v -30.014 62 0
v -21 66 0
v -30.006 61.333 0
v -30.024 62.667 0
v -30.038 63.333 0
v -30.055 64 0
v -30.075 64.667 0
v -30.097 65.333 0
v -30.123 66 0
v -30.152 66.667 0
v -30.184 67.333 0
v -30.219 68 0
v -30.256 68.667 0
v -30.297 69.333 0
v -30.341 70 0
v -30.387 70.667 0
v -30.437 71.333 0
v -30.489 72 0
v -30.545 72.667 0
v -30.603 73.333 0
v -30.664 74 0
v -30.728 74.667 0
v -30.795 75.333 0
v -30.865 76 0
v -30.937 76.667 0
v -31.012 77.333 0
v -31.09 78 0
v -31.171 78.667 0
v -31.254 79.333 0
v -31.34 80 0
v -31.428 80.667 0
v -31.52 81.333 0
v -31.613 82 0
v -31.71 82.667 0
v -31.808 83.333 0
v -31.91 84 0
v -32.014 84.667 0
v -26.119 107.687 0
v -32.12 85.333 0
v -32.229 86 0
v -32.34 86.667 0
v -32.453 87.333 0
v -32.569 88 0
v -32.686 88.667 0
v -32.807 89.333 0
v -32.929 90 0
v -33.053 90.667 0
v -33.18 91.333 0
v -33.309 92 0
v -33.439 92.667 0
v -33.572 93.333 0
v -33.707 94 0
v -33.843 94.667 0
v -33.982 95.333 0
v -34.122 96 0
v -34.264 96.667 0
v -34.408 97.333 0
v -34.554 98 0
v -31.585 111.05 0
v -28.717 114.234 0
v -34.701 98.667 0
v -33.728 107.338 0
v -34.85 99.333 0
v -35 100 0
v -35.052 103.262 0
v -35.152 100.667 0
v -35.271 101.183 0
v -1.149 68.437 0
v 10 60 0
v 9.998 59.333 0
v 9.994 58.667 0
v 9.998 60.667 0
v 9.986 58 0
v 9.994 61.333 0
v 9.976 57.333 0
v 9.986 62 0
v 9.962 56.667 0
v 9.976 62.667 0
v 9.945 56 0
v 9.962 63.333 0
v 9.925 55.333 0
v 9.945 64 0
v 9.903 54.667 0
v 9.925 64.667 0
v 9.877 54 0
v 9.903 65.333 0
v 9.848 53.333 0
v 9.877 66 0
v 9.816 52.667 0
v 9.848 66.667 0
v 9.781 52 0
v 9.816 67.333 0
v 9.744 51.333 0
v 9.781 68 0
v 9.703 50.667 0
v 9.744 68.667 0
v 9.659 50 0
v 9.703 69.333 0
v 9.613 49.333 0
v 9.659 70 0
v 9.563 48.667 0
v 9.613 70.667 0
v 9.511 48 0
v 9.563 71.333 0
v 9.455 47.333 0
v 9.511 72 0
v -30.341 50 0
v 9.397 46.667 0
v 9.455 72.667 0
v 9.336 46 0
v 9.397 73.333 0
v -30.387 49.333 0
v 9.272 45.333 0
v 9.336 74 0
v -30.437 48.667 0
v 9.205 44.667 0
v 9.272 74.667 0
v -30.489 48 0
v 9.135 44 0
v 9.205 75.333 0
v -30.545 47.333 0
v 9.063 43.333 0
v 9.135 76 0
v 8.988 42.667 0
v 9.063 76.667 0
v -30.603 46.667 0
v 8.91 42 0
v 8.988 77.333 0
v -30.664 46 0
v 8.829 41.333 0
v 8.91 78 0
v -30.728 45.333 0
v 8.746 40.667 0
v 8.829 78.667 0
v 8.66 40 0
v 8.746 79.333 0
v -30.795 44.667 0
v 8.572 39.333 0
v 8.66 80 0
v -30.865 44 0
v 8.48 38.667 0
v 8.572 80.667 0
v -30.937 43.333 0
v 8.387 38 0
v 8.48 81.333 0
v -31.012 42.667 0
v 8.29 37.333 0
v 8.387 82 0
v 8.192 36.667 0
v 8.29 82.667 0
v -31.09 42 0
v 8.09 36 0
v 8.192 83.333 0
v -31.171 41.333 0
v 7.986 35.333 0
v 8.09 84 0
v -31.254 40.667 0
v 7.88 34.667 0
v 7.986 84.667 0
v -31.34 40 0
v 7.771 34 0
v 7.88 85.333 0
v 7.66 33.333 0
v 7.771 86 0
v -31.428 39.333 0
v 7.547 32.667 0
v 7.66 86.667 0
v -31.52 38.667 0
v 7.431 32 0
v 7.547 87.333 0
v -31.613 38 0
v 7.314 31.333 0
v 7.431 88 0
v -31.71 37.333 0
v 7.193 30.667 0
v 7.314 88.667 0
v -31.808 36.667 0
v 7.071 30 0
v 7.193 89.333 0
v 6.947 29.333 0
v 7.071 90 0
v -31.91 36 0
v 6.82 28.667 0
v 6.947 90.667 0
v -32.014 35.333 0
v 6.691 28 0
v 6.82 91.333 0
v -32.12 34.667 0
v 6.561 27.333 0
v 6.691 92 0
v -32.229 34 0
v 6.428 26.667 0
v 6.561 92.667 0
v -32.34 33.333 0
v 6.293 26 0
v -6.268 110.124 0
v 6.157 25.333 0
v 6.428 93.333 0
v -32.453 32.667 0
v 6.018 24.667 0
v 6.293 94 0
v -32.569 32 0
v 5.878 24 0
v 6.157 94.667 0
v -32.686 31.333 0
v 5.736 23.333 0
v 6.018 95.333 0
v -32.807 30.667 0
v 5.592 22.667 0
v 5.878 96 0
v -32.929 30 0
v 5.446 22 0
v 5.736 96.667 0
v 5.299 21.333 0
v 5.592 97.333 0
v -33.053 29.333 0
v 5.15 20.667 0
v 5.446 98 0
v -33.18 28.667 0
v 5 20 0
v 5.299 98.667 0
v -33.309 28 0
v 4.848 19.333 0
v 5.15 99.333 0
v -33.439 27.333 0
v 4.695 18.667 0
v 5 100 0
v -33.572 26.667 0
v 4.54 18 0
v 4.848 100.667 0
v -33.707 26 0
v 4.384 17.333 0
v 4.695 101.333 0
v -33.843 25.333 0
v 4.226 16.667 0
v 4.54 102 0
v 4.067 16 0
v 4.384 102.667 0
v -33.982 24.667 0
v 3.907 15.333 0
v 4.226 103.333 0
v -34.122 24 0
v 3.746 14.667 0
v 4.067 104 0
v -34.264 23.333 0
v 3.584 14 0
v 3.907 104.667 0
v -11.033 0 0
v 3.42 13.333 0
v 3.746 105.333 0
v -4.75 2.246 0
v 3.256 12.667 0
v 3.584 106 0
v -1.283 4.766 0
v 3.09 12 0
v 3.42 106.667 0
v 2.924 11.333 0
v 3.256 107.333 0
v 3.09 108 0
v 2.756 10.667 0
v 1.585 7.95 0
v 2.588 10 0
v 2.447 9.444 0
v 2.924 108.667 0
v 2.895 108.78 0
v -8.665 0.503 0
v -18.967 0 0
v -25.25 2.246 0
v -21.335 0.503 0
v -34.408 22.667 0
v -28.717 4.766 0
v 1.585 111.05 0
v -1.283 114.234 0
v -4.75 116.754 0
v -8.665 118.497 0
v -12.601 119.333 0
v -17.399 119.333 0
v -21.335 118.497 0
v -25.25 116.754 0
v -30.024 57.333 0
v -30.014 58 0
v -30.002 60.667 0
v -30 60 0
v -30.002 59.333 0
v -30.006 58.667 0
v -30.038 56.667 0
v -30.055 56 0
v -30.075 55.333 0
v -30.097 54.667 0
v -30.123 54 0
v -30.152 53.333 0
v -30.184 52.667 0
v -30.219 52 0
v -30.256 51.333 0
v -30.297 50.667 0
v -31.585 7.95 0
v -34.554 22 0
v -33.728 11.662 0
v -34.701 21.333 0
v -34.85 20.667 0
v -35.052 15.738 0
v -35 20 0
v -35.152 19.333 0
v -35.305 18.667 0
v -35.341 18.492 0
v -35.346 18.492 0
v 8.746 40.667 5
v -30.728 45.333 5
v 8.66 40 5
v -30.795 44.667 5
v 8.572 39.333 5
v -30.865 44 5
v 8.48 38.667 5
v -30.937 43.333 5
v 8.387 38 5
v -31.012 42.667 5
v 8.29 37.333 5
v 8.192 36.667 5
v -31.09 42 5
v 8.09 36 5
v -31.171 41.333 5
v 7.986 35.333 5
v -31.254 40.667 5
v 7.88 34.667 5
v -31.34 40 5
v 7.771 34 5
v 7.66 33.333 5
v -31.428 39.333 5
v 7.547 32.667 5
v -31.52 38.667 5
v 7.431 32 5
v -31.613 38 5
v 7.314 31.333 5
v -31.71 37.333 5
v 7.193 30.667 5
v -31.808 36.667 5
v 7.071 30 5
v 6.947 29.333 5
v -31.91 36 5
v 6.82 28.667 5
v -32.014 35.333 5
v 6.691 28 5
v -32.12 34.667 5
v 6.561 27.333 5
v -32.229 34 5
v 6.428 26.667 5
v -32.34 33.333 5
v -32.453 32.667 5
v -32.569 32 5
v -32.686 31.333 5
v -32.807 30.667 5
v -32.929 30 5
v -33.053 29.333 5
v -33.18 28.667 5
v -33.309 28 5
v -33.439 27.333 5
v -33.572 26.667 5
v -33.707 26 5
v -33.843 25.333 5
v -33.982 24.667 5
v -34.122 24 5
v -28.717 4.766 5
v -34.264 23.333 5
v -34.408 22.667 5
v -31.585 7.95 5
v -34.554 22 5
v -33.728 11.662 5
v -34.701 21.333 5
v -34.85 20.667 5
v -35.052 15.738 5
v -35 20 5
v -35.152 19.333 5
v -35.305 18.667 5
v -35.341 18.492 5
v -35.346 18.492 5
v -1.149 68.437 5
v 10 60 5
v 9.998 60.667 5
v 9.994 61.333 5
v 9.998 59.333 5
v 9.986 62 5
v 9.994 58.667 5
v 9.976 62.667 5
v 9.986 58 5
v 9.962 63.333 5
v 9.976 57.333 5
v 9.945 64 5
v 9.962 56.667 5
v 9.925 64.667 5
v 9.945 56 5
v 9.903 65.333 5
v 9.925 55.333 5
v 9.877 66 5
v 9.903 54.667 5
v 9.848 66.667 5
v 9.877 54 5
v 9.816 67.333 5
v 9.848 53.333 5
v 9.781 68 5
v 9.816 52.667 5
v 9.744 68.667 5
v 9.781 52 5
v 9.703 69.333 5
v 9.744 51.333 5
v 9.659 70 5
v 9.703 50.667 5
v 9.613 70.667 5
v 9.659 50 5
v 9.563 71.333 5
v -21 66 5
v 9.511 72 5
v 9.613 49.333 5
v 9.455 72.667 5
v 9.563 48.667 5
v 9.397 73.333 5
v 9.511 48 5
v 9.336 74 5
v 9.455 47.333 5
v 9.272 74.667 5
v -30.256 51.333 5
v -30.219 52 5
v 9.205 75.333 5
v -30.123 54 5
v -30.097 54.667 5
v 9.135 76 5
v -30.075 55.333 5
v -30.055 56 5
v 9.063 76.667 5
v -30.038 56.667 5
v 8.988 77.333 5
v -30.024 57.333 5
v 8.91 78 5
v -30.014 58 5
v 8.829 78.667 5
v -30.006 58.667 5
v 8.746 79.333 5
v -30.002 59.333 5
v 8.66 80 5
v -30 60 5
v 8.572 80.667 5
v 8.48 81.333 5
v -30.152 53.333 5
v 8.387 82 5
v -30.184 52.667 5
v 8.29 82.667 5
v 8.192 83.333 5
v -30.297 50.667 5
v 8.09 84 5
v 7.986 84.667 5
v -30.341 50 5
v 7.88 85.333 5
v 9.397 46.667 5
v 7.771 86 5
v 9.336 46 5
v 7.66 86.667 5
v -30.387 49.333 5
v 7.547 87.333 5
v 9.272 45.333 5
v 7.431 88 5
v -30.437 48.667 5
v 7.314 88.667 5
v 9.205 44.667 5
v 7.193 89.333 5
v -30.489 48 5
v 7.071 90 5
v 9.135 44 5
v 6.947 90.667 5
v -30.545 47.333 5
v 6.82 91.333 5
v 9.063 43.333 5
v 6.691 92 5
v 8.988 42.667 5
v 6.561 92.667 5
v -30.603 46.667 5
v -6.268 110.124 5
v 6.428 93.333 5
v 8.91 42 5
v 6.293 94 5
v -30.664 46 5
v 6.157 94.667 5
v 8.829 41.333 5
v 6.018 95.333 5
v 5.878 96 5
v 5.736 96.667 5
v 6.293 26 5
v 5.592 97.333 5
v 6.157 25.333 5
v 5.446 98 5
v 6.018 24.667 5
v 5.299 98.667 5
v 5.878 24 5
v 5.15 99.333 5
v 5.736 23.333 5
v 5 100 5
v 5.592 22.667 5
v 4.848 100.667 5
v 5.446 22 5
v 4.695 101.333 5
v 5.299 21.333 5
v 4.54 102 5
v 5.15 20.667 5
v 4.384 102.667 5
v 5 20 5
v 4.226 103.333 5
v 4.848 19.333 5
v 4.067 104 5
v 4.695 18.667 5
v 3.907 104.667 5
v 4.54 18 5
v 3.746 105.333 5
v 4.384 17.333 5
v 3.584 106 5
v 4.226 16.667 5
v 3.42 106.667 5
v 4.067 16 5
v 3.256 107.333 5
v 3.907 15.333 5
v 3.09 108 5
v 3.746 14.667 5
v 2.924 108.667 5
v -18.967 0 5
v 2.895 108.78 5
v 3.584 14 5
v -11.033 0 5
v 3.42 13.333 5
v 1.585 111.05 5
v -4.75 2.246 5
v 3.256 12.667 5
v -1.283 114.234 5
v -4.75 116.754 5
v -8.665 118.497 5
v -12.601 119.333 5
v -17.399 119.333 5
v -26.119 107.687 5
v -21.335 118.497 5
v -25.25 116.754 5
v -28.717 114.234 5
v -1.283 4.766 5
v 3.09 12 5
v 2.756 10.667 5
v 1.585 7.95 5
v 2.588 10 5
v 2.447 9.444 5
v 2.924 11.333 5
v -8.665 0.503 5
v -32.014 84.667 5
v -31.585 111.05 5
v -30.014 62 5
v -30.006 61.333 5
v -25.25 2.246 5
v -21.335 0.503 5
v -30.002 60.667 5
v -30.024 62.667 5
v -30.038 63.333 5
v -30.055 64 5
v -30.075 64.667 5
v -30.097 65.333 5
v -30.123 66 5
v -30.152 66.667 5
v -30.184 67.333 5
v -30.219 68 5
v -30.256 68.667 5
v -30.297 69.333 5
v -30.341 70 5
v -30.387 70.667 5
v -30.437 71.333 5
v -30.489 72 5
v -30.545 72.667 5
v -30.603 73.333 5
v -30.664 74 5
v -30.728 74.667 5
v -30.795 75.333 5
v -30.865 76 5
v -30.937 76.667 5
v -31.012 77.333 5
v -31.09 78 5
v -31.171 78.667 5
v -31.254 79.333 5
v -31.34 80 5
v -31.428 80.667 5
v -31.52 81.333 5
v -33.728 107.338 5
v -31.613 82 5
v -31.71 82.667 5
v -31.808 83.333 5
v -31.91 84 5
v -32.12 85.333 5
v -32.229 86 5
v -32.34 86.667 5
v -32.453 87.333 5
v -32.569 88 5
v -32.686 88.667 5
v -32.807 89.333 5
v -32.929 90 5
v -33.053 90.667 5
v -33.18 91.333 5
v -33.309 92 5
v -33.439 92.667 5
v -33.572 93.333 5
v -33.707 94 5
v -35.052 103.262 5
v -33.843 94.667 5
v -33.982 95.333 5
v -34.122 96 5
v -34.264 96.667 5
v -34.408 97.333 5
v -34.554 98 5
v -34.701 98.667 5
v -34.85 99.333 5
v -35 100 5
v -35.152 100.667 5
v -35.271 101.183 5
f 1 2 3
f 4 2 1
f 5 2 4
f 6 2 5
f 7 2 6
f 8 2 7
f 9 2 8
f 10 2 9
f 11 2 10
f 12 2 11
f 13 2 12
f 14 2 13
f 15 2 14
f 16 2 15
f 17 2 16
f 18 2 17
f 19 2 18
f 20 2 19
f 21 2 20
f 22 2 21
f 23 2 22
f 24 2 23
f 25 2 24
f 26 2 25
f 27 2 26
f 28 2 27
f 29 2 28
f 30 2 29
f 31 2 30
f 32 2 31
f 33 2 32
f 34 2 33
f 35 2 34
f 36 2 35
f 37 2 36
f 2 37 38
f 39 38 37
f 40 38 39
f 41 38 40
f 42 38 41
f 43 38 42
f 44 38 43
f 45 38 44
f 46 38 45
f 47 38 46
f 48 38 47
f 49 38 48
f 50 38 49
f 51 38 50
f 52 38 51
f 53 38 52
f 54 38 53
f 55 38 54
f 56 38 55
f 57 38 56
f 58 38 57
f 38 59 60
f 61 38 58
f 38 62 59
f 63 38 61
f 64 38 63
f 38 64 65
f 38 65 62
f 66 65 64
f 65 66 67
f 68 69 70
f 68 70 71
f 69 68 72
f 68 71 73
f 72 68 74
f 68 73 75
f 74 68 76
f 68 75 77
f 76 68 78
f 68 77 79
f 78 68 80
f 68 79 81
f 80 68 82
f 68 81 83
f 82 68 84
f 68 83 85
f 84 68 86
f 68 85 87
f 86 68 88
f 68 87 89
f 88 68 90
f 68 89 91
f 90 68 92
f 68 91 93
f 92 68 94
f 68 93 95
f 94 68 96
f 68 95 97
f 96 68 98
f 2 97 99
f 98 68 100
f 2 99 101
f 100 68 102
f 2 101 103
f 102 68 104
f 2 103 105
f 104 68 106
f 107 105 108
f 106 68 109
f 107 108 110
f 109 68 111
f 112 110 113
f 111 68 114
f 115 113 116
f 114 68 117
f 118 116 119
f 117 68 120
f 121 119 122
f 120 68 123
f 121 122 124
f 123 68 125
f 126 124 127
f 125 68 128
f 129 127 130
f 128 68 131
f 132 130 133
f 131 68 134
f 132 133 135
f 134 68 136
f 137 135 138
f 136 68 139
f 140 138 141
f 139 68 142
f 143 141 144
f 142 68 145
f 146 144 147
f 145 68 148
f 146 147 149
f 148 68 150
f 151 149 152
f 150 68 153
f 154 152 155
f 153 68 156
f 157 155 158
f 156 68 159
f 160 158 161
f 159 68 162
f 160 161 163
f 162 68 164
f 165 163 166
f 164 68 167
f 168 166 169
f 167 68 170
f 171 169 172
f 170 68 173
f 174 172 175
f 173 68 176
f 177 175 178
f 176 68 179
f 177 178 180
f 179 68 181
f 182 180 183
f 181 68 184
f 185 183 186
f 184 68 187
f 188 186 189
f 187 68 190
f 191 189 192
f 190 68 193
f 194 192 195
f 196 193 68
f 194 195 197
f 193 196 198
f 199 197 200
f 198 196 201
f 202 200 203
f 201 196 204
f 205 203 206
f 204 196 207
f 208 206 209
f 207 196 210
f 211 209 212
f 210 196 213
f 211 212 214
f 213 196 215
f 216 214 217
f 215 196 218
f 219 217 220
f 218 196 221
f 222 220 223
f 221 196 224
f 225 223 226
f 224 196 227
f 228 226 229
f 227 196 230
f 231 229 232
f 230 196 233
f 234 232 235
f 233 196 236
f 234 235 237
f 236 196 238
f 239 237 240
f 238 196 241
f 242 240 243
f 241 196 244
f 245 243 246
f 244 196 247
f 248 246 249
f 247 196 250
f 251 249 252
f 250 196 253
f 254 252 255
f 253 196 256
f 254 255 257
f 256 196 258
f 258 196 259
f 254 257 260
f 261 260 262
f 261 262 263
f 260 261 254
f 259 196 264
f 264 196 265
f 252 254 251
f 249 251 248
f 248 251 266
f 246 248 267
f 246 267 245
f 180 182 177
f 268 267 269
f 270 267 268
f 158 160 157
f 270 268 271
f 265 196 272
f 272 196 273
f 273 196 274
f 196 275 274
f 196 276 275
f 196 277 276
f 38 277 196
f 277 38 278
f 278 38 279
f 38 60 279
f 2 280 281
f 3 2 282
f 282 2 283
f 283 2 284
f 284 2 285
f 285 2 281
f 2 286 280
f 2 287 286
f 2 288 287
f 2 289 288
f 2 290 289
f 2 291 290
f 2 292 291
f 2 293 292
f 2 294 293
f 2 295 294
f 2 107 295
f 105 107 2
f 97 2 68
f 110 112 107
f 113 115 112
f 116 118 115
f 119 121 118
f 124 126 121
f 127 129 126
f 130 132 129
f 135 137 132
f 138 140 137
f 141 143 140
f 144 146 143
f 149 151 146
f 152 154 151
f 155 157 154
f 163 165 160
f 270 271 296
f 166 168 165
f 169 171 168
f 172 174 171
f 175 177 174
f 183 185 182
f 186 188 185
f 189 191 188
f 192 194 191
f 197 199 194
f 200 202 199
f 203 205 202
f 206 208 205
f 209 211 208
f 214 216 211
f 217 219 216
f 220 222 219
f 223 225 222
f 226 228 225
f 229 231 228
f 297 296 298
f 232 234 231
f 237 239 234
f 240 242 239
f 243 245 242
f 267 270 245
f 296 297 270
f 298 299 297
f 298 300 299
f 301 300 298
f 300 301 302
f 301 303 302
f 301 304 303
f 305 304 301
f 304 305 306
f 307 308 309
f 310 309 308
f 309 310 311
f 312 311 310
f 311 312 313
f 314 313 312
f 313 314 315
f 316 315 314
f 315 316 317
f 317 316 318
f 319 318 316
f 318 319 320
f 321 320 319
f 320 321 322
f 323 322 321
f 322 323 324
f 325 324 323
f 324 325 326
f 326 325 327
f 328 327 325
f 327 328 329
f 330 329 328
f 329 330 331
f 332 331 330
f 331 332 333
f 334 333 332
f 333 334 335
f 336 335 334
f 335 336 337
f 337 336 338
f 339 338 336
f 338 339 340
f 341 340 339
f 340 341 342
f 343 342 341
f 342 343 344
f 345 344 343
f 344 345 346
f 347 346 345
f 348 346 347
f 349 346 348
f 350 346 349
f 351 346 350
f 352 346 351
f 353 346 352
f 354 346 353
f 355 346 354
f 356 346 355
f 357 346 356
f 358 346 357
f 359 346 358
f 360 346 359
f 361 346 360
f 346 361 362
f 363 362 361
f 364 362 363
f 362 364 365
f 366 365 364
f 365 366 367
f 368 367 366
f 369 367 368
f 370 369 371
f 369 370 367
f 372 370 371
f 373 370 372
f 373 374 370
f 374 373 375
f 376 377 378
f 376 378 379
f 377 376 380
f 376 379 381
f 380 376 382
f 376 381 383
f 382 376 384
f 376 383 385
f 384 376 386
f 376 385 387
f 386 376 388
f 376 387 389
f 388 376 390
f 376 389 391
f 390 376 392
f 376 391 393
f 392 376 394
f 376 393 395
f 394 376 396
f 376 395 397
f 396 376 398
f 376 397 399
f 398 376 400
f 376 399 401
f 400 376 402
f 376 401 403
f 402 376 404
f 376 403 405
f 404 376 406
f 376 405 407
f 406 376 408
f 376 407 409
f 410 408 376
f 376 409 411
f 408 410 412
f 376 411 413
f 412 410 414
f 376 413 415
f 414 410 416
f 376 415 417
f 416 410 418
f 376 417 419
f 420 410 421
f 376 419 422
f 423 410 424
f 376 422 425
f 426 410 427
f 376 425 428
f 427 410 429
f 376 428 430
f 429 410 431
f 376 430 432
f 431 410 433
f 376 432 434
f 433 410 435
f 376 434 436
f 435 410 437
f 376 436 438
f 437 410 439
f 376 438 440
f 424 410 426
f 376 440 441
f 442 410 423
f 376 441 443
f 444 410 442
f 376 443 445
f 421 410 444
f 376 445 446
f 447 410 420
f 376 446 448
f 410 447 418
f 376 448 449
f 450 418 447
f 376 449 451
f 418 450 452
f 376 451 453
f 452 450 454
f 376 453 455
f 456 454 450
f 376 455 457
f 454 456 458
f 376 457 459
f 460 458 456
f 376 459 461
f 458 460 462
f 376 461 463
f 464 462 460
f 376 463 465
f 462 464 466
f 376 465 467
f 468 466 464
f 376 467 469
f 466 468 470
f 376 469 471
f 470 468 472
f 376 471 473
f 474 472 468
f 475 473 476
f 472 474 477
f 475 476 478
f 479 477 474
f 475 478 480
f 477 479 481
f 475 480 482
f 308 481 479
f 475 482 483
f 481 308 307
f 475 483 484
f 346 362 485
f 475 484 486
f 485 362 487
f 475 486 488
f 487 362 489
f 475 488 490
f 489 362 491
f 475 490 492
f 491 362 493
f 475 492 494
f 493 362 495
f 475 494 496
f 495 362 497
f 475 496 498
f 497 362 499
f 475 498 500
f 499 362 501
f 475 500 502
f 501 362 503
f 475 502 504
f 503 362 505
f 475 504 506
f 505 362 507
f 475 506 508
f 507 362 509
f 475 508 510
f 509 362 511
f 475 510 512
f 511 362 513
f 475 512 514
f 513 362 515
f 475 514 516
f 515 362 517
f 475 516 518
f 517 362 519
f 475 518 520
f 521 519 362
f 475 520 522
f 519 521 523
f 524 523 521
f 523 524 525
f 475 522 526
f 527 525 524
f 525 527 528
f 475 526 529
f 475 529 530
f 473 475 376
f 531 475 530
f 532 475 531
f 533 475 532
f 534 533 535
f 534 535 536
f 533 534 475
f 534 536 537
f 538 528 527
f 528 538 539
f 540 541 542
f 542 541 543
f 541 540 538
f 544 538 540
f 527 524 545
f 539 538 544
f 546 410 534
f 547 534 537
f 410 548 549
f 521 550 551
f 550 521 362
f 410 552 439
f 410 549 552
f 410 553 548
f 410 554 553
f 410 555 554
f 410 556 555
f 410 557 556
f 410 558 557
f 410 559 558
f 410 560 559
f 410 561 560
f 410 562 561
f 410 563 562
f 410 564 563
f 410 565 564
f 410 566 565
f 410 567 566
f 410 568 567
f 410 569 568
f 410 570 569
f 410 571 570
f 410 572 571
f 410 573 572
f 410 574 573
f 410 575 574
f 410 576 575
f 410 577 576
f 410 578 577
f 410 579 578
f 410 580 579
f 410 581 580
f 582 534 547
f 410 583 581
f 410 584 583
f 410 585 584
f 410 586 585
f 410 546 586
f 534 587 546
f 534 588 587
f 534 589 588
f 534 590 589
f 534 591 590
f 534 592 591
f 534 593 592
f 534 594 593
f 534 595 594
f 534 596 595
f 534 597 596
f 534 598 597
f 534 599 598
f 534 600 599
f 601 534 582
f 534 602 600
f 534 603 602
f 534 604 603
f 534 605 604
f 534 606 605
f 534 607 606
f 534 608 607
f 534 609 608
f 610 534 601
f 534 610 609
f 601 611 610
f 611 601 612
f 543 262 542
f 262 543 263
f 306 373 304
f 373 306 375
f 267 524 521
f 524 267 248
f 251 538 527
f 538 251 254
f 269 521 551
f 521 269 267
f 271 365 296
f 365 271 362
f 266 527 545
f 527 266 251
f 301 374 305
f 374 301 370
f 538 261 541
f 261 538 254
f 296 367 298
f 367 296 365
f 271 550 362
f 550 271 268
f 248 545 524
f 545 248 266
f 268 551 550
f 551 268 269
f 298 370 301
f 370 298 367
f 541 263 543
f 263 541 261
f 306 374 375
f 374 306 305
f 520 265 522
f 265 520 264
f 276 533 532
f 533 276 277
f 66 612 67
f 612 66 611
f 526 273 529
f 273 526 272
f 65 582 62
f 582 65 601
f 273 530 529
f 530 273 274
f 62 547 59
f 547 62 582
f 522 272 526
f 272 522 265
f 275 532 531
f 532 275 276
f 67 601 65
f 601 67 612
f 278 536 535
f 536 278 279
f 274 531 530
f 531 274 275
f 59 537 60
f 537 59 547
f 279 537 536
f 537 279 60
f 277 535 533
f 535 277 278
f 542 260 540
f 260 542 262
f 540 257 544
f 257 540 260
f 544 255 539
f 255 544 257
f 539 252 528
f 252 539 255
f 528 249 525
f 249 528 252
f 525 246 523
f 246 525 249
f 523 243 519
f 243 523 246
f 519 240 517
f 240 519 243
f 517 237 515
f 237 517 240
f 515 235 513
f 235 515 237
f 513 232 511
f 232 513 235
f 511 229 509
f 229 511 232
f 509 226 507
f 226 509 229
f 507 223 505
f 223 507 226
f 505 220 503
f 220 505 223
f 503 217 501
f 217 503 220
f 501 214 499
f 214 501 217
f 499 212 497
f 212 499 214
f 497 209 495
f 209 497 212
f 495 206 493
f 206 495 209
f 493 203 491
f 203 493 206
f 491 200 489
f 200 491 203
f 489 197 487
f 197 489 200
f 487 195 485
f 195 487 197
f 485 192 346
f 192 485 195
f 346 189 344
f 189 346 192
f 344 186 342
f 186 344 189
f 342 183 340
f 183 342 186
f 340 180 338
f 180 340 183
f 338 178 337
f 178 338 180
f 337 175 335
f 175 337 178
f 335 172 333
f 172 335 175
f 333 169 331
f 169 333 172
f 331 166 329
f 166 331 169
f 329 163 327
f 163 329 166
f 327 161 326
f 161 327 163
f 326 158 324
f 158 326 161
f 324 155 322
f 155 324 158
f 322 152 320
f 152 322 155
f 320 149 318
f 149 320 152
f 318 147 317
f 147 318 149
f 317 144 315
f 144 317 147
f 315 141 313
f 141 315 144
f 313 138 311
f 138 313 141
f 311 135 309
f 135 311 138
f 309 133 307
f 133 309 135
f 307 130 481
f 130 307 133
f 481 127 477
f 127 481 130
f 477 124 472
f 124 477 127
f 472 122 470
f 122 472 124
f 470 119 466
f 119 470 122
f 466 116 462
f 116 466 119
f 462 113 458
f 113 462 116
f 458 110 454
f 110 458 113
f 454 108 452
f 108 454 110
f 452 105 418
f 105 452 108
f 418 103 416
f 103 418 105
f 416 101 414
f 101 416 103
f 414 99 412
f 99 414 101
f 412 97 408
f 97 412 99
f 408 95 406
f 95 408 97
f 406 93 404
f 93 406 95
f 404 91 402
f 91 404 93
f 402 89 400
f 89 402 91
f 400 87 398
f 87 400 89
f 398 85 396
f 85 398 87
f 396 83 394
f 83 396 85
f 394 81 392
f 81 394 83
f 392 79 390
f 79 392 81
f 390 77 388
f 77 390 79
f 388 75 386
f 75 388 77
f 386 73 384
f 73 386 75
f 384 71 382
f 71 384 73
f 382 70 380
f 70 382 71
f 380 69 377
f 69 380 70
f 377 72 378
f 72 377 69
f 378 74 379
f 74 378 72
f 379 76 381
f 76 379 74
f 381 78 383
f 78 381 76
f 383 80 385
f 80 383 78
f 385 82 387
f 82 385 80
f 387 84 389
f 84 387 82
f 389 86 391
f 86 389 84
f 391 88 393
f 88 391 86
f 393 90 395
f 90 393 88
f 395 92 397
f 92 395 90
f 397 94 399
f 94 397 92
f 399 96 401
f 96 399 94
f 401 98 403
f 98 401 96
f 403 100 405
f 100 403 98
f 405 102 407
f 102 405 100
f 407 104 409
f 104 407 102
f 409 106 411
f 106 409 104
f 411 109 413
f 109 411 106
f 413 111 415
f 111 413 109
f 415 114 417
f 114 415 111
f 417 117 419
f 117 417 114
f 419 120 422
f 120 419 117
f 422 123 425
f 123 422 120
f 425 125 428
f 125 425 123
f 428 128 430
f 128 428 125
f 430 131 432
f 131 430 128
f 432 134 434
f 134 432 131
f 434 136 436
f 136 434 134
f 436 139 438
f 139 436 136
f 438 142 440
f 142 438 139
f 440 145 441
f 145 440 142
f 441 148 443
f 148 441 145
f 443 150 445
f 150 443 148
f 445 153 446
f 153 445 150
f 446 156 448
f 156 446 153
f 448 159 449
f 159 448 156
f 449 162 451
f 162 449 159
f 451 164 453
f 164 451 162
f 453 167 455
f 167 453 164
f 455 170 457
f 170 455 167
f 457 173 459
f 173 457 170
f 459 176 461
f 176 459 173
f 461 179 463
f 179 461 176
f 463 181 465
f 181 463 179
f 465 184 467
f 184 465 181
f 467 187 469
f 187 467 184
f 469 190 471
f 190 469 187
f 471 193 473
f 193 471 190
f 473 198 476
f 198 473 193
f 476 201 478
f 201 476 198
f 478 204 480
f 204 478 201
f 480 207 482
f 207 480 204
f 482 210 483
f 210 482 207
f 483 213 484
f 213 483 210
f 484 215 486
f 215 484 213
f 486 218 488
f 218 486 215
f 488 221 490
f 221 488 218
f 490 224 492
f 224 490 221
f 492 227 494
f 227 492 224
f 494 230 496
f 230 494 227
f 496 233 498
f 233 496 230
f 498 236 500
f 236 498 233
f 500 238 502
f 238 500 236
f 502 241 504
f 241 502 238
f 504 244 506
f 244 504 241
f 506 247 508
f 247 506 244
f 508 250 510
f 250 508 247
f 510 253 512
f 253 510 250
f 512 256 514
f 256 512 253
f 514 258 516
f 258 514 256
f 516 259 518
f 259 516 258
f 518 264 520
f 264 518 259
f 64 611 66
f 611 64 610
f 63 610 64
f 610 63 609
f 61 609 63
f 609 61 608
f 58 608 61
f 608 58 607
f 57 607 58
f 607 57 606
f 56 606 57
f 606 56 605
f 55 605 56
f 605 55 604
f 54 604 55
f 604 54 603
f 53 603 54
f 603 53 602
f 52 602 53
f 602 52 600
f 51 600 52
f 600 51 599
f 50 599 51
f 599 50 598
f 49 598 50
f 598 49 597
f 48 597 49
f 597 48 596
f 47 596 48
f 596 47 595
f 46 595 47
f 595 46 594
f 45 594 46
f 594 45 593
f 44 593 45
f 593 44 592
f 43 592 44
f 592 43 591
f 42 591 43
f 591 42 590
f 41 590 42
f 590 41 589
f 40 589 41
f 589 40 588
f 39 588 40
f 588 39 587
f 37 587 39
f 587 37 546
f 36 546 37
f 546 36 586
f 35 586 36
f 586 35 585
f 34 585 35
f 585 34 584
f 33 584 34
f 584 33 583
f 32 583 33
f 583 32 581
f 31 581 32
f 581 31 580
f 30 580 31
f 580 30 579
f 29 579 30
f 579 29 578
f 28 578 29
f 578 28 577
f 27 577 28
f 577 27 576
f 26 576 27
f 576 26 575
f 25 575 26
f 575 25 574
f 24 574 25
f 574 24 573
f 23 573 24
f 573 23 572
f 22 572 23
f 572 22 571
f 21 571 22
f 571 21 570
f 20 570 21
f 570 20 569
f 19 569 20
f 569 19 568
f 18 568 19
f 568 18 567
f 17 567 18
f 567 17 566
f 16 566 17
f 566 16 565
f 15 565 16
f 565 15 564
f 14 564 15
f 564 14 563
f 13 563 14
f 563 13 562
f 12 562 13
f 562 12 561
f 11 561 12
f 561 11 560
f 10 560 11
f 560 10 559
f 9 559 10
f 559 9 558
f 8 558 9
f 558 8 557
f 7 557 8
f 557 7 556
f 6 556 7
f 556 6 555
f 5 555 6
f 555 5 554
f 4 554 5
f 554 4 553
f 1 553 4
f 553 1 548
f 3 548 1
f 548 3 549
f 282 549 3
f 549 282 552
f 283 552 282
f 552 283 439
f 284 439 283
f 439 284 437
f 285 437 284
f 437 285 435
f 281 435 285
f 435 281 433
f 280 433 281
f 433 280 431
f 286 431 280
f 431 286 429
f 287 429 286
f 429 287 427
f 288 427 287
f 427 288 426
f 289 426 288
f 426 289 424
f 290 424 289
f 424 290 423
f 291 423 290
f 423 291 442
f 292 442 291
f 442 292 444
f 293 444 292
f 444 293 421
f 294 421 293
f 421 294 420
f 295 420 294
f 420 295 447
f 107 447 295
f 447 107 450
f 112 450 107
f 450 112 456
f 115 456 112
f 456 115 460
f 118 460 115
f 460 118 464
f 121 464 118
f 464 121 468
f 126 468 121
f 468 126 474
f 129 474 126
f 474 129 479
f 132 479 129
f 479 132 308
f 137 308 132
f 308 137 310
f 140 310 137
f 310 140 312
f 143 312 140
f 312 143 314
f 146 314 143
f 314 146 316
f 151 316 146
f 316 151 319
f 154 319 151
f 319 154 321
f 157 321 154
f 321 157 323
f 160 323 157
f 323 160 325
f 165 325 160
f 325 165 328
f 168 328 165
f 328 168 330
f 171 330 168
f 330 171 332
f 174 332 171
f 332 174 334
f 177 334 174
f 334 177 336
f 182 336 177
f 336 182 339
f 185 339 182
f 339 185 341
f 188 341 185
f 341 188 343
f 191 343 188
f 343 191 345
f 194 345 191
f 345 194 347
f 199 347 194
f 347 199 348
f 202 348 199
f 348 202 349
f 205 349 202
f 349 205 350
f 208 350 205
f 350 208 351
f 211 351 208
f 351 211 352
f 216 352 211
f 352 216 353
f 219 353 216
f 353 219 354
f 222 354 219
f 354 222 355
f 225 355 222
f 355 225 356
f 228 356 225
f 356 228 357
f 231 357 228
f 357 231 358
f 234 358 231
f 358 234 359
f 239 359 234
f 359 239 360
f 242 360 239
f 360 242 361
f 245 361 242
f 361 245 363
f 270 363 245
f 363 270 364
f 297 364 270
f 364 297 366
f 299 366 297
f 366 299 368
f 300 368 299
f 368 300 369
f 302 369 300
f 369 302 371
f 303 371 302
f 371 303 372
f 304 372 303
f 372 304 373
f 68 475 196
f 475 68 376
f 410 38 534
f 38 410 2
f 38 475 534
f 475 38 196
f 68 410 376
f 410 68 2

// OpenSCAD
// file: small-parts.scad
module servo_u_holder()
{
	holewidth = 8;
	holeheight = 8;
	partwidth = 20;
	partheight = 26;
	wall = 8;
	
	difference()
	{
		cube([partwidth, partheight, wall]);
		translate([partwidth/2-holewidth/2,0,0])
			cube([holewidth, holeheight, wall]);
	}
}

servo_u_holder();
// main file
use <small-parts.scad>
use <femur.scad>

module coxa()
{
	width = 40;
	length = 80;
	wall = 5;
	radiusaxle = 8.7/2;
	radiuswheel = 20.7/2;
	heightwheel = 2.5;
	compwidth = 26;
	compheight = 20;
	compwall = 8;
	servowidth = 41;
	difference()
	{
		union()
		{
			cylinder(r=width/2,h=wall);
			translate([length,0,0])
				cylinder(r=width/2,h=wall);
			translate([0,-width/2,0])
				cube([length, width, wall]);
		}
		cylinder(r=radiusaxle,h=wall);
		translate([0,0,heightwheel])
			cylinder(r=radiuswheel,h=wall);
	}
	union()
	{
		//translate([length-compwall,-width/2,-compheight])
			//cube([compwall,compwidth,compheight]);
		translate([length-2*compwall-servowidth,-width/2,-compheight])
			cube([compwall,compwidth,compheight]);
		translate([length-2*compwall-servowidth,-width/2,-compheight-wall])
			cube([servowidth+2*compwall,compwidth,wall]);
	}
}

module legconture()
{
	wall = 5;
	difference()
	{
		femurbase();
		difference()
		{
			femurbase();
			translate([-15,20,-2])
				cylinder(r=20.5,h=wall+4);
			translate([-60,20,-2])
				rotate([0,0,-3.5])
					cube([70,120,wall+4]);
		}
		difference()
		{
			femurbase();
			translate([-15,99,-2])
				cylinder(r=20.5,h=wall+4);
			translate([-40,-20,-2])
				rotate([0,0,3.5])
					cube([70,120,wall+4]);
		}
	}
}

module femur()
{
	wall = 5;
	radiusaxle = 8.7/2;
	radiuswheel = 20.7/2;
	heightwheel = 2.5;
	difference()
	{
		legconture();
		translate([-16,radiuswheel+5,0])
			cylinder(r=radiusaxle,h=wall);
		translate([-16,radiuswheel+5,heightwheel])
			cylinder(r=radiuswheel,h=wall);
		translate([-16,120-radiuswheel-5,0])
			cylinder(r=radiusaxle,h=wall);
		translate([-16,120-radiuswheel-5,heightwheel])
			cylinder(r=radiuswheel,h=wall);
	}
}

module tibia()
{
	wall = 5;
	servowidth = 20;
	servolength = 42;
	difference()
	{
		legconture();
		translate([-11-servowidth/2,120-servolength-12,-2])
			rotate([0,0,7])
				cube([servowidth, servolength, wall+4]);
	}
}


//coxa();
//translate([80-8,-20,0])rotate([0,90,0])servo_u_holder();
//projection(cut=true)
//femur();
tibia();
